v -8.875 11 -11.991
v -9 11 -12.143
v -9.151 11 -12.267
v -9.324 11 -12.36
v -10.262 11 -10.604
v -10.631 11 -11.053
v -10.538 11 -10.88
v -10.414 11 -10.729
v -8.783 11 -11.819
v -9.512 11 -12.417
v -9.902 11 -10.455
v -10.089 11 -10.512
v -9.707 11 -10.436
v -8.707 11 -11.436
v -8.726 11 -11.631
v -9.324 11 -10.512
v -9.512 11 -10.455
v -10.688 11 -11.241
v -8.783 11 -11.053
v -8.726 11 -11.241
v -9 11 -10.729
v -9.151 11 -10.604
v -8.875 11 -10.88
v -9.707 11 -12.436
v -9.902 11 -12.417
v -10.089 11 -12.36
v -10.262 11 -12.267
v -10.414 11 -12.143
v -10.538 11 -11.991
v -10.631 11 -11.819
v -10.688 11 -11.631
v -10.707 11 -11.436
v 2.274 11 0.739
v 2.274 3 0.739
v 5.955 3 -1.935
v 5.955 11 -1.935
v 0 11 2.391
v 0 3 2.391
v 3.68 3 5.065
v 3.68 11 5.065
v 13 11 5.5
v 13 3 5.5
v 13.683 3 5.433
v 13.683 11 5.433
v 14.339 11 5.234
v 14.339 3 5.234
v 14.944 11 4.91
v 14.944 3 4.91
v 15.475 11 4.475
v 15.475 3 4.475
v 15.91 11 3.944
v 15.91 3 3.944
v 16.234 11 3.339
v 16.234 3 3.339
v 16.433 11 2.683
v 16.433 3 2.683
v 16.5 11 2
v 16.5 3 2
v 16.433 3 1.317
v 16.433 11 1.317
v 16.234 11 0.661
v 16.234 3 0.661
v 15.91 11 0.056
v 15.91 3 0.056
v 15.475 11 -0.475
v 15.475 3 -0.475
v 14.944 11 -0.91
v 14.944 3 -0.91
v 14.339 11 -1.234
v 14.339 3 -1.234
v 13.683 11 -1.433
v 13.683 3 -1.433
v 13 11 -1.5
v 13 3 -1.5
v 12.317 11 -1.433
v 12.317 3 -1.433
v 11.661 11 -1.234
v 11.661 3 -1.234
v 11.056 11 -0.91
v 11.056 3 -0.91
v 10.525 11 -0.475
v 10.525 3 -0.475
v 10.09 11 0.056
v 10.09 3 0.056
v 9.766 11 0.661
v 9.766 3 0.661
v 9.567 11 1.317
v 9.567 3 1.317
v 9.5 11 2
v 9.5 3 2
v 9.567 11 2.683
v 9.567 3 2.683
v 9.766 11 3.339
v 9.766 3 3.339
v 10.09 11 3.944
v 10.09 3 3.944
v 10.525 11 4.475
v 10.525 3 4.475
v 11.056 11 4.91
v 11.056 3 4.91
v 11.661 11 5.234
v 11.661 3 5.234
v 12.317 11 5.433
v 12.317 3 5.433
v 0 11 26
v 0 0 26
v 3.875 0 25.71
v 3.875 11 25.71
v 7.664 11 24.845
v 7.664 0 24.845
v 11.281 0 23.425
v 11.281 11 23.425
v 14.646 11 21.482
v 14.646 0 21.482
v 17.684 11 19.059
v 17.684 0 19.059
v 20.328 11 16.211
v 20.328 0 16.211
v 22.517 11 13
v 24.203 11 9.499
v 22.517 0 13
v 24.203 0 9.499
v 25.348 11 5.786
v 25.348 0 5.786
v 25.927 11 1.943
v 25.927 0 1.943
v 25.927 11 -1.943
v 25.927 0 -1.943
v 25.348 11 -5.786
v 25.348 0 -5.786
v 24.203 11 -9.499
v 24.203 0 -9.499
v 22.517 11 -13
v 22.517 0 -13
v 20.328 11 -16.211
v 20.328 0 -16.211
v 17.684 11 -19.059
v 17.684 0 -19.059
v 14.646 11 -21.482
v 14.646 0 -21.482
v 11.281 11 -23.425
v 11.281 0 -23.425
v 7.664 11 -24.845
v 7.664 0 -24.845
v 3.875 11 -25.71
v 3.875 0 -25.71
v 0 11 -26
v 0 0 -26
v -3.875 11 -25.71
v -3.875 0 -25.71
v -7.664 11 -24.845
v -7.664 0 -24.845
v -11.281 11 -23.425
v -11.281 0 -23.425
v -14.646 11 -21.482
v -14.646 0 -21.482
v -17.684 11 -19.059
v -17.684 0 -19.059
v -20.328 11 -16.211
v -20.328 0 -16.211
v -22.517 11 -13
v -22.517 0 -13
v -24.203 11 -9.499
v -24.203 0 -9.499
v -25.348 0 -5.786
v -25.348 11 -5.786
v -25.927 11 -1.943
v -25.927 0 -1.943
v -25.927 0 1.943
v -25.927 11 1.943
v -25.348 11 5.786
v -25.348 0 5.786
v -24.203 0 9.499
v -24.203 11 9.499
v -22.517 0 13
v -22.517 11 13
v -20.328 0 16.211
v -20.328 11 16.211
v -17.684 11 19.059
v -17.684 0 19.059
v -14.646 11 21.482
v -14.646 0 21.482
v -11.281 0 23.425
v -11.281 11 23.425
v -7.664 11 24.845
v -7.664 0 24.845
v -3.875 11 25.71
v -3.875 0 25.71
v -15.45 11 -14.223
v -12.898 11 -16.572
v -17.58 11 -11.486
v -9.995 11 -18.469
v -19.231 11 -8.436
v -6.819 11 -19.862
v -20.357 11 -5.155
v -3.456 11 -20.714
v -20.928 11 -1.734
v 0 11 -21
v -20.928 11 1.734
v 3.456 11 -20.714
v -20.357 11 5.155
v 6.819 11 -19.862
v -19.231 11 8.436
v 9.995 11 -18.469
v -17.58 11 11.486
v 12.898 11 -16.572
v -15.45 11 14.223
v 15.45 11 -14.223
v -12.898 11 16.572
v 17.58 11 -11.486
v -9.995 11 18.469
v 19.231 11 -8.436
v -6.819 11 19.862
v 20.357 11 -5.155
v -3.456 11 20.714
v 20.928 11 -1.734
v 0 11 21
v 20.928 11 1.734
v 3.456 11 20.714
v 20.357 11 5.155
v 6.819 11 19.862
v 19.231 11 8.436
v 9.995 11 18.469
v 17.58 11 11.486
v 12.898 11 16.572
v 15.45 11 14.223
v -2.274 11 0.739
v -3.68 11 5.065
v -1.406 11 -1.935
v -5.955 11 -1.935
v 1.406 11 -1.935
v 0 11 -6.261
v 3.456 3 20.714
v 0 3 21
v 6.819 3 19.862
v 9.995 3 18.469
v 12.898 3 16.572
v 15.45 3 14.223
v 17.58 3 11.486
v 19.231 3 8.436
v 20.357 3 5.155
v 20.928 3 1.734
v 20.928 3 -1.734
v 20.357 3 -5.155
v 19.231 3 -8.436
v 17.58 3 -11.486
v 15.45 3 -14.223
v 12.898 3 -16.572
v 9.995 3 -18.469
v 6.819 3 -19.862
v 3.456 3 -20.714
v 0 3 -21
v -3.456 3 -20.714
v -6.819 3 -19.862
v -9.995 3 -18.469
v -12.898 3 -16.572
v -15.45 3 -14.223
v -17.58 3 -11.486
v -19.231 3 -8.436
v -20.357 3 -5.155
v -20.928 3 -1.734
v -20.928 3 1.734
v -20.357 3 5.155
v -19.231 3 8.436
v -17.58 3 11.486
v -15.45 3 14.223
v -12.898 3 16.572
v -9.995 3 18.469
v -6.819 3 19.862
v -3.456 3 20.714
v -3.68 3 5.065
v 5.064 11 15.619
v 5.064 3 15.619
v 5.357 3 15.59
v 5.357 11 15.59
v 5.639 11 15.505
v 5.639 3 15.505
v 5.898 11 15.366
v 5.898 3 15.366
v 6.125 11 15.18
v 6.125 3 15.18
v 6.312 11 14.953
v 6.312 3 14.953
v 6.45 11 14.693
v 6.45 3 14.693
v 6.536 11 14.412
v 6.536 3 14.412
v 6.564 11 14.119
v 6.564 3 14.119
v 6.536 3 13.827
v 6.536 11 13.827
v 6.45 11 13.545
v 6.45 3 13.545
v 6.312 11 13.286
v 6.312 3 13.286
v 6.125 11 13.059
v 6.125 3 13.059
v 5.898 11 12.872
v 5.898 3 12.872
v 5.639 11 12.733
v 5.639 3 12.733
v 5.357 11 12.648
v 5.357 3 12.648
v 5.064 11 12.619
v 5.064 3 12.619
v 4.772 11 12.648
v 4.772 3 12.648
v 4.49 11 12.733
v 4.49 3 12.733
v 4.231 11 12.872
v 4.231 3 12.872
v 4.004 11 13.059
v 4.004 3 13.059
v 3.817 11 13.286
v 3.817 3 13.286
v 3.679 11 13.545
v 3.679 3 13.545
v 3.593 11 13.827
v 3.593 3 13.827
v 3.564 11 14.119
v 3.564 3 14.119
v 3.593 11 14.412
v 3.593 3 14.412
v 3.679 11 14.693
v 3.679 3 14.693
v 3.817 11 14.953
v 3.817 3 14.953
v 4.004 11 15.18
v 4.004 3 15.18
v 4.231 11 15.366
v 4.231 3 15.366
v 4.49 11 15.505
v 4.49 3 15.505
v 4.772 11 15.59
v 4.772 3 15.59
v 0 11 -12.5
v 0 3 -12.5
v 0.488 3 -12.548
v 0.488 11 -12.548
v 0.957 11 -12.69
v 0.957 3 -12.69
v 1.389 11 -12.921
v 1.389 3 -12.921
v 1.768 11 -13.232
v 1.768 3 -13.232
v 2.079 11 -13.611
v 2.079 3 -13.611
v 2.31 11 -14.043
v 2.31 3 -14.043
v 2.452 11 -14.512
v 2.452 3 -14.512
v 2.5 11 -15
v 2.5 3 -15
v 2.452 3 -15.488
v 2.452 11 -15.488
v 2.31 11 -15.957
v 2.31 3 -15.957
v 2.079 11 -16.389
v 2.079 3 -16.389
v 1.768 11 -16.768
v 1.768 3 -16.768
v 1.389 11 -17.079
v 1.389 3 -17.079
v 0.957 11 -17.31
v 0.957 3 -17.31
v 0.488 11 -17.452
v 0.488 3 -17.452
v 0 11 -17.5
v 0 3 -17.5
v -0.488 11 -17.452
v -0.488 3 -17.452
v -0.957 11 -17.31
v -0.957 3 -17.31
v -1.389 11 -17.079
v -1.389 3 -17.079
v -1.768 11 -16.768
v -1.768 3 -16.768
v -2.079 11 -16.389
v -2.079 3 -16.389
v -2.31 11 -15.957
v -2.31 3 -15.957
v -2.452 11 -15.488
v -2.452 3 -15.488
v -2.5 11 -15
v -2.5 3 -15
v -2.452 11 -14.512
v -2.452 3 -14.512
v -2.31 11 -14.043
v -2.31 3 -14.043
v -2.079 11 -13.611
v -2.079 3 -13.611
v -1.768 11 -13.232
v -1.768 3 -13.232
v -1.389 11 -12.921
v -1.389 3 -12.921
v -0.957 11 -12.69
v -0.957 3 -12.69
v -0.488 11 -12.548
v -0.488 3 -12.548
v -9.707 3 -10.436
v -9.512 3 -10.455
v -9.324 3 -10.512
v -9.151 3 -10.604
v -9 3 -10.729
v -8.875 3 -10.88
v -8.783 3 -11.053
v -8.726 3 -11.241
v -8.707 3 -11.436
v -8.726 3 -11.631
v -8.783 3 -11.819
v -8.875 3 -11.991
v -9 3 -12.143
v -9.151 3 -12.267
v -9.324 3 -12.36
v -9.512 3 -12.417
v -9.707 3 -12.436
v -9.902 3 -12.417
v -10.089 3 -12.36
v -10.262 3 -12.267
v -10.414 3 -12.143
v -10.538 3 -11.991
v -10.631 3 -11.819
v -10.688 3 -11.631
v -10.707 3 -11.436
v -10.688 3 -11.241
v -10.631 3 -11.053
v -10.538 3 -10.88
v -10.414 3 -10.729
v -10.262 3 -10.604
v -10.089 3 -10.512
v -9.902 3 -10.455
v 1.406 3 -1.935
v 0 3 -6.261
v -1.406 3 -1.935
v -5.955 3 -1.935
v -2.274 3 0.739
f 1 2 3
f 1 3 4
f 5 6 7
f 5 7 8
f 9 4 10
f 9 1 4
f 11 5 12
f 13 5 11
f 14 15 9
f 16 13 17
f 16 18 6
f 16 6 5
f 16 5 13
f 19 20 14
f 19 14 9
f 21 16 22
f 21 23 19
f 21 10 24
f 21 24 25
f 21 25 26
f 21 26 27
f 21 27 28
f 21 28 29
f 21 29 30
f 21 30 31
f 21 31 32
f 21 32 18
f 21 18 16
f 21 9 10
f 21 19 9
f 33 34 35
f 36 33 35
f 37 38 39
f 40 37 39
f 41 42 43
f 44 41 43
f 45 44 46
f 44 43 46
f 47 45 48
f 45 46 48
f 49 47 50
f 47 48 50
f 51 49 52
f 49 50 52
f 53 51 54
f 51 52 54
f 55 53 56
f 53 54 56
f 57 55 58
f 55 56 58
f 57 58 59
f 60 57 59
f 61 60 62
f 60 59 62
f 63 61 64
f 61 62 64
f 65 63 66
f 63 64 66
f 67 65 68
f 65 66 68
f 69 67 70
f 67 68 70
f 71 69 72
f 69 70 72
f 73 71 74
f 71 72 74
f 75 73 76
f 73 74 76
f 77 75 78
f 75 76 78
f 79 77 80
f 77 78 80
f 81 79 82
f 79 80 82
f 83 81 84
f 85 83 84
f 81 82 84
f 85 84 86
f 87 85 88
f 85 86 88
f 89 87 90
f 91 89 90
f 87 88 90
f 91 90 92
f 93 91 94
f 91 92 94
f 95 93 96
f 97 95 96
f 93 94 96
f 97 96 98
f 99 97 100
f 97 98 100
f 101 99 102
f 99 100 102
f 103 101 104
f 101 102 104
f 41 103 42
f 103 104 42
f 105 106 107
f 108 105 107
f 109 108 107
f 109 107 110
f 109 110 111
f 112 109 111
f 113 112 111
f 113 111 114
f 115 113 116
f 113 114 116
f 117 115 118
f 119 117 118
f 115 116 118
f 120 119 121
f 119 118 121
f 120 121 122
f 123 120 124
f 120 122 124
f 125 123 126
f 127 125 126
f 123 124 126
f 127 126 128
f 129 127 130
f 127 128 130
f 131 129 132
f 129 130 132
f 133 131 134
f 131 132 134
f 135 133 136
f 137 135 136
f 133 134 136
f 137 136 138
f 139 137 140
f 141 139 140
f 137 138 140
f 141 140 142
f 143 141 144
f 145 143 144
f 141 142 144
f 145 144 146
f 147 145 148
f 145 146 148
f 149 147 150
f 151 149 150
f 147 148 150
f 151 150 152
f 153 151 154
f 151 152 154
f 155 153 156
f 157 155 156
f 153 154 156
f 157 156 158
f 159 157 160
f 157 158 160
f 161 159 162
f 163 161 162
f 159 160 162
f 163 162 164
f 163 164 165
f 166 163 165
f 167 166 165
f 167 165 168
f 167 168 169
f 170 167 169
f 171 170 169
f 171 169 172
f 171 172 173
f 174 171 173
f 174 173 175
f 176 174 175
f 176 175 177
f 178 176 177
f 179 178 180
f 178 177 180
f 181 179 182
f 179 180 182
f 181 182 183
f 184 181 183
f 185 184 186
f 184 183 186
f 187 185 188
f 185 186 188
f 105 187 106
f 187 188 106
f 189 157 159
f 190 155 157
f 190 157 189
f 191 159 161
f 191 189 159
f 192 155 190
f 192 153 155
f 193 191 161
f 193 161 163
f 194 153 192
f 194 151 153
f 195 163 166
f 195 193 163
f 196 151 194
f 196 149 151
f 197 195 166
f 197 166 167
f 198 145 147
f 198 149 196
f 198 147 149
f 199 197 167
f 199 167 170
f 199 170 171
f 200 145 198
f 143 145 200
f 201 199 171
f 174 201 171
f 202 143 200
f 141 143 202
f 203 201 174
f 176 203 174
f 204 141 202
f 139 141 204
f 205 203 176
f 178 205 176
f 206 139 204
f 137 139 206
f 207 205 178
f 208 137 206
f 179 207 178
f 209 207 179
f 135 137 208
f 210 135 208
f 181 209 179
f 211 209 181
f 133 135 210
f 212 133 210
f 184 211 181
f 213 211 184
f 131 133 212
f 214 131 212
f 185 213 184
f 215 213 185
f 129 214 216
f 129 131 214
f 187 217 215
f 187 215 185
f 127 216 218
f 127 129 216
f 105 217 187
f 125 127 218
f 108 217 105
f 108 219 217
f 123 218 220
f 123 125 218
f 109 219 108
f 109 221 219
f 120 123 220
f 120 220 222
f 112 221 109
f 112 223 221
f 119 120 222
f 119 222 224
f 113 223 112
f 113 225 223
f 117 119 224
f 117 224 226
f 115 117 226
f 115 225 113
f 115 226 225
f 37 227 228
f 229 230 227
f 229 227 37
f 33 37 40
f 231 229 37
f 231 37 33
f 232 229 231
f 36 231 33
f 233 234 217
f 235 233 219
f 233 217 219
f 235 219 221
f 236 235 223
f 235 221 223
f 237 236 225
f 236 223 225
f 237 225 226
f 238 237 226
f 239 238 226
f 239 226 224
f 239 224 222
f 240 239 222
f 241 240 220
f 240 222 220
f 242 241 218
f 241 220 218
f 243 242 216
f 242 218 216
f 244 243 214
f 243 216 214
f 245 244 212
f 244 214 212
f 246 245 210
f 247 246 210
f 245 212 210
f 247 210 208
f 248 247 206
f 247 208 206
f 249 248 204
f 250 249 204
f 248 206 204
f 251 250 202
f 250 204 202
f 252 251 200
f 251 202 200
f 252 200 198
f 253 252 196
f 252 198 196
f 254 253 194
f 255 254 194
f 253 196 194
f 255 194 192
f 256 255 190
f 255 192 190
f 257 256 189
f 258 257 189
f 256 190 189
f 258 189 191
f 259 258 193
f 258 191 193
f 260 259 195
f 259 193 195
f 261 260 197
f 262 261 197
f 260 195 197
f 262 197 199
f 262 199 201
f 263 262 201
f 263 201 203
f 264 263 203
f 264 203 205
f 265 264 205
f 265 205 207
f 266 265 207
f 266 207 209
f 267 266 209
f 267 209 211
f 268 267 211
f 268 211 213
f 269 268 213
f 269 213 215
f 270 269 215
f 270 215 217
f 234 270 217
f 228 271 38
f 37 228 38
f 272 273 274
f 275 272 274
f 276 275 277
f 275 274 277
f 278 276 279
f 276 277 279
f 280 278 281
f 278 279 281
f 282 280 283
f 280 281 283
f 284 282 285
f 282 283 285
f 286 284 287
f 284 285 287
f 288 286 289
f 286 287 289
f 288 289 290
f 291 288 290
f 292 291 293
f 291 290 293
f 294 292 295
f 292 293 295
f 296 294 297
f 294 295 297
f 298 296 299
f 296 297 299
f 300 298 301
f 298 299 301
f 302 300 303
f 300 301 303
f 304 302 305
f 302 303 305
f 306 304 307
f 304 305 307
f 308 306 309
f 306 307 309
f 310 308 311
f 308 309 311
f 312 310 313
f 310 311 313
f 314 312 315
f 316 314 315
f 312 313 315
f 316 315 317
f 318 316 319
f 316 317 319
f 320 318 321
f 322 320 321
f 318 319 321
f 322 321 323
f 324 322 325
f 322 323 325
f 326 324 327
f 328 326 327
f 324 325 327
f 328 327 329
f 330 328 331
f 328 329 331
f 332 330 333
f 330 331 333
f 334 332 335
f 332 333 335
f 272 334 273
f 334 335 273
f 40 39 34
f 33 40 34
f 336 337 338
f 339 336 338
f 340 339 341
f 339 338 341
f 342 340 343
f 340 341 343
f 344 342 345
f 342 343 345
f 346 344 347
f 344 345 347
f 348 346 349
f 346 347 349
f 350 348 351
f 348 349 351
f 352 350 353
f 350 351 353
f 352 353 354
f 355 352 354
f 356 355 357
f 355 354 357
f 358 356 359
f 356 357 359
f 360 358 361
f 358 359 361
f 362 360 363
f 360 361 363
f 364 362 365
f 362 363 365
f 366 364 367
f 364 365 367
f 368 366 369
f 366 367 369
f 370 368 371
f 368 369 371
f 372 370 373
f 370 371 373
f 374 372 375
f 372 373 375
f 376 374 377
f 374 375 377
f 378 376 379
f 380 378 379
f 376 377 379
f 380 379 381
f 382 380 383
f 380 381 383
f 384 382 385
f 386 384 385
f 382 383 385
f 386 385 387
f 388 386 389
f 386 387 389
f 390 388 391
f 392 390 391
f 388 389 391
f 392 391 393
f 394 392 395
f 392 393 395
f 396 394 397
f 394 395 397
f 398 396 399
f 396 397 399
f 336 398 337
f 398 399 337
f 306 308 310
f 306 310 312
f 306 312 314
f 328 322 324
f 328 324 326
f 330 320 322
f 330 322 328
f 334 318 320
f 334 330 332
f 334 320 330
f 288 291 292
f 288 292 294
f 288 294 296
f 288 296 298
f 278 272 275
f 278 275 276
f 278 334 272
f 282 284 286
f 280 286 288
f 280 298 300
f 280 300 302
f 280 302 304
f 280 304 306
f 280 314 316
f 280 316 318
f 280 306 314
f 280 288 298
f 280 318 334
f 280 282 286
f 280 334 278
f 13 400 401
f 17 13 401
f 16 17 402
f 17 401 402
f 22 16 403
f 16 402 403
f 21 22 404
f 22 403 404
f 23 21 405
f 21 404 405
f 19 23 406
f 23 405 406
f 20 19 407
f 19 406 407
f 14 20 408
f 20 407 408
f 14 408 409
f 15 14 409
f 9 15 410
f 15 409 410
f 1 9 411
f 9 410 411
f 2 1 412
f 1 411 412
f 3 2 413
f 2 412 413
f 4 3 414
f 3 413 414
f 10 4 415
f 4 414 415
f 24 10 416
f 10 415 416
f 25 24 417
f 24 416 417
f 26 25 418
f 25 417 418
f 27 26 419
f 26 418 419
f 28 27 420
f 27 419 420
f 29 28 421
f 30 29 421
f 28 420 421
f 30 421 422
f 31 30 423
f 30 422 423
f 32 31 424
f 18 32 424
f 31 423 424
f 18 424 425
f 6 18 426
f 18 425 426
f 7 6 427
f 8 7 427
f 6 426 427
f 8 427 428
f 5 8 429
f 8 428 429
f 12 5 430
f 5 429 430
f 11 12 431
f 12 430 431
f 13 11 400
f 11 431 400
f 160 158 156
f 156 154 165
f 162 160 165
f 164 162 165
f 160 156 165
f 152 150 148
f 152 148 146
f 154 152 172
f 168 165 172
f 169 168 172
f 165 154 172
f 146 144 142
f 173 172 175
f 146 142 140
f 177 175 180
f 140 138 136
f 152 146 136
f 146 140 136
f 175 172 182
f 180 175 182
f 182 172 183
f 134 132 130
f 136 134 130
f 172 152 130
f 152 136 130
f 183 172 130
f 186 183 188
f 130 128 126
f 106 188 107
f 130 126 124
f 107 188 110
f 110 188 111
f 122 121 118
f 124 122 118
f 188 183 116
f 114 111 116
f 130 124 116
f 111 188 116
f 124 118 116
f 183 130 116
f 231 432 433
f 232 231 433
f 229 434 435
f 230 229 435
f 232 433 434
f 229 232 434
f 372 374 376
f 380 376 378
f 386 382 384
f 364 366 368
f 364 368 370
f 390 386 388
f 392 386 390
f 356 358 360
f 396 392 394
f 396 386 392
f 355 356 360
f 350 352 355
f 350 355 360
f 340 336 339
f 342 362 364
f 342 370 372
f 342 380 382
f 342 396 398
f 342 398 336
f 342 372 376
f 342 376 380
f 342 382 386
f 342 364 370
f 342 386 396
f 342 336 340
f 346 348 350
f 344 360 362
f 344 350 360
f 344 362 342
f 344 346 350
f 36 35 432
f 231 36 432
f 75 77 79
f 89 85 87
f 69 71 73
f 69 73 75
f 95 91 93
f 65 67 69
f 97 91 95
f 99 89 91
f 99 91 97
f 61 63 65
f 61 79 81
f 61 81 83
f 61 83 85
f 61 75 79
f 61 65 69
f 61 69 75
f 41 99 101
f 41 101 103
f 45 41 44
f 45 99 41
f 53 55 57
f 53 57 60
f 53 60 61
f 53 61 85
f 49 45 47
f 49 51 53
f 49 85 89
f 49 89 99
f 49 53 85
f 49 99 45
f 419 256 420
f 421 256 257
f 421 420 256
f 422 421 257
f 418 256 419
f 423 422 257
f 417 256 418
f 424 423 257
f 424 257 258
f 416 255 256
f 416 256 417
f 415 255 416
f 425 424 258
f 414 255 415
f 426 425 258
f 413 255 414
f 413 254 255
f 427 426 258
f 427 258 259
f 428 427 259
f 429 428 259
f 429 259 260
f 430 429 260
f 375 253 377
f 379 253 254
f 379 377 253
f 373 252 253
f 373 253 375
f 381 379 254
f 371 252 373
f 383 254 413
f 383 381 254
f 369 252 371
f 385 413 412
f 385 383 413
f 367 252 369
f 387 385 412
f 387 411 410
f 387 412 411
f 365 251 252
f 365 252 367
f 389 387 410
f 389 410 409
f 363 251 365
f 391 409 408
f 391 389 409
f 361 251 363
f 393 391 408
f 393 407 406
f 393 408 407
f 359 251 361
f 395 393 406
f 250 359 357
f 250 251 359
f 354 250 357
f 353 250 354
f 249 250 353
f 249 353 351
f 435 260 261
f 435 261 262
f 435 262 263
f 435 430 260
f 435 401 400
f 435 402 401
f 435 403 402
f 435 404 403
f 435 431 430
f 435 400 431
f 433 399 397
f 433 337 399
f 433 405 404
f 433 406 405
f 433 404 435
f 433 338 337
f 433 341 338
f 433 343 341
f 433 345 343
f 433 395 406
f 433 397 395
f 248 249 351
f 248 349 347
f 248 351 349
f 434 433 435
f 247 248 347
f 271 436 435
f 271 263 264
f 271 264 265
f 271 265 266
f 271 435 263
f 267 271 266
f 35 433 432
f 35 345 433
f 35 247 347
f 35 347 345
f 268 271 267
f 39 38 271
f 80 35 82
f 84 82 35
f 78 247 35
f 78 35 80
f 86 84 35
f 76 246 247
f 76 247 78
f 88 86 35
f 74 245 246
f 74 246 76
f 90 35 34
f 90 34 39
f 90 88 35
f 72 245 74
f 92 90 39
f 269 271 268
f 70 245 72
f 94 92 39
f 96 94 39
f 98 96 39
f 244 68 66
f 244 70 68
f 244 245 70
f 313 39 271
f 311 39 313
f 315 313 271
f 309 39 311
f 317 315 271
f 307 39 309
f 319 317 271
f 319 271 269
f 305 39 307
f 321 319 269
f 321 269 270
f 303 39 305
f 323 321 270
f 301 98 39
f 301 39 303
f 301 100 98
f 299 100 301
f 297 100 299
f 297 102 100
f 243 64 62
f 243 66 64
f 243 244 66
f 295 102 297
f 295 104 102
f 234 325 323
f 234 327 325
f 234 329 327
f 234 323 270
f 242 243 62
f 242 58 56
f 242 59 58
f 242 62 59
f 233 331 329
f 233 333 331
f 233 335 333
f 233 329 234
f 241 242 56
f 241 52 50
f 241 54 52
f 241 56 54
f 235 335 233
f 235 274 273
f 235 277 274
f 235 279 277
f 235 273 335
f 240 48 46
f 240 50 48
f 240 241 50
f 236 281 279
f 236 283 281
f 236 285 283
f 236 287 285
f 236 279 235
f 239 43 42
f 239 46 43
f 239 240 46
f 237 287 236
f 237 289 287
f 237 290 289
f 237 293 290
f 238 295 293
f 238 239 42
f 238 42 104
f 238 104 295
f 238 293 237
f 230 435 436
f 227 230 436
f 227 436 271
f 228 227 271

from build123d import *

# Parameters (mm, degrees)
SKETCH1_R           = 26
BOSS_EXTRUDE1_DEPTH = 11
SKETCH2_R           = 21
CUT_EXTRUDE1_DEPTH  = 8
BOSS_EXTRUDE2_DEPTH = 8
SKETCH5_R           = 1
BOSS_EXTRUDE3_DEPTH = 8
SKETCH6_R           = 2.5
BOSS_EXTRUDE4_DEPTH = 8
SKETCH7_R           = 3.5
BOSS_EXTRUDE5_DEPTH = 8
SKETCH11_R          = 1.5
BOSS_EXTRUDE6_DEPTH = 8


with BuildPart() as part:
    # Sketch1 → Boss-Extrude1 (new body)
    with BuildSketch(Plane(origin=(0, 0, 0), x_dir=(1, 0, 0), z_dir=(0, 1, 0))):
        with Locations(Location((0, 0, 0), (0, 0, 270))):
            Circle(SKETCH1_R)
    extrude(amount=BOSS_EXTRUDE1_DEPTH)

    # Sketch2 → Cut-Extrude1 (cut)
    with BuildSketch(Plane(origin=(0, 11, 0), x_dir=(1, 0, 0), z_dir=(0, 1, 0))):
        with Locations(Location((0, 0, 0), (0, 0, 270))):
            Circle(SKETCH2_R)
    extrude(amount=-CUT_EXTRUDE1_DEPTH, mode=Mode.SUBTRACT)

    # Sketch3 → Boss-Extrude2 (add)
    with BuildSketch(Plane(origin=(0, 3, 0), x_dir=(1, 0, 0), z_dir=(0, 1, 0))):
        Polygon((0, 6.260990337), (-1.405679911, 1.934752416), (-5.954555658, 1.934752416), (-2.274437874, -0.739009663), (-3.680117785, -5.065247584), (0, -2.391485505), (3.680117785, -5.065247584), (2.274437874, -0.739009663), (5.954555658, 1.934752416), (1.405679911, 1.934752416), align=None)
    extrude(amount=BOSS_EXTRUDE2_DEPTH)

    # Sketch5 → Boss-Extrude3 (add)
    with BuildSketch(Plane(origin=(0, 3, 0), x_dir=(1, 0, 0), z_dir=(0, 1, 0))):
        with Locations(Location((-9.706719743, 11.435890513, 0), (0, 0, 270))):
            Circle(SKETCH5_R)
    extrude(amount=BOSS_EXTRUDE3_DEPTH)

    # Sketch6 → Boss-Extrude4 (add)
    with BuildSketch(Plane(origin=(0, 3, 0), x_dir=(1, 0, 0), z_dir=(0, 1, 0))):
        with Locations(Location((0, 15, 0), (0, 0, 270))):
            Circle(SKETCH6_R)
    extrude(amount=BOSS_EXTRUDE4_DEPTH)

    # Sketch7 → Boss-Extrude5 (add)
    with BuildSketch(Plane(origin=(0, 3, 0), x_dir=(1, 0, 0), z_dir=(0, 1, 0))):
        with Locations(Location((13, -2, 0), (0, 0, 270))):
            Circle(SKETCH7_R)
    extrude(amount=BOSS_EXTRUDE5_DEPTH)

    # Sketch11 → Boss-Extrude6 (add)
    with BuildSketch(Plane(origin=(0, 3, 0), x_dir=(1, 0, 0), z_dir=(0, 1, 0))):
        with Locations(Location((5.064482164, -14.119172086, 0), (0, 0, 270))):
            Circle(SKETCH11_R)
    extrude(amount=BOSS_EXTRUDE6_DEPTH)


solid = part.part
